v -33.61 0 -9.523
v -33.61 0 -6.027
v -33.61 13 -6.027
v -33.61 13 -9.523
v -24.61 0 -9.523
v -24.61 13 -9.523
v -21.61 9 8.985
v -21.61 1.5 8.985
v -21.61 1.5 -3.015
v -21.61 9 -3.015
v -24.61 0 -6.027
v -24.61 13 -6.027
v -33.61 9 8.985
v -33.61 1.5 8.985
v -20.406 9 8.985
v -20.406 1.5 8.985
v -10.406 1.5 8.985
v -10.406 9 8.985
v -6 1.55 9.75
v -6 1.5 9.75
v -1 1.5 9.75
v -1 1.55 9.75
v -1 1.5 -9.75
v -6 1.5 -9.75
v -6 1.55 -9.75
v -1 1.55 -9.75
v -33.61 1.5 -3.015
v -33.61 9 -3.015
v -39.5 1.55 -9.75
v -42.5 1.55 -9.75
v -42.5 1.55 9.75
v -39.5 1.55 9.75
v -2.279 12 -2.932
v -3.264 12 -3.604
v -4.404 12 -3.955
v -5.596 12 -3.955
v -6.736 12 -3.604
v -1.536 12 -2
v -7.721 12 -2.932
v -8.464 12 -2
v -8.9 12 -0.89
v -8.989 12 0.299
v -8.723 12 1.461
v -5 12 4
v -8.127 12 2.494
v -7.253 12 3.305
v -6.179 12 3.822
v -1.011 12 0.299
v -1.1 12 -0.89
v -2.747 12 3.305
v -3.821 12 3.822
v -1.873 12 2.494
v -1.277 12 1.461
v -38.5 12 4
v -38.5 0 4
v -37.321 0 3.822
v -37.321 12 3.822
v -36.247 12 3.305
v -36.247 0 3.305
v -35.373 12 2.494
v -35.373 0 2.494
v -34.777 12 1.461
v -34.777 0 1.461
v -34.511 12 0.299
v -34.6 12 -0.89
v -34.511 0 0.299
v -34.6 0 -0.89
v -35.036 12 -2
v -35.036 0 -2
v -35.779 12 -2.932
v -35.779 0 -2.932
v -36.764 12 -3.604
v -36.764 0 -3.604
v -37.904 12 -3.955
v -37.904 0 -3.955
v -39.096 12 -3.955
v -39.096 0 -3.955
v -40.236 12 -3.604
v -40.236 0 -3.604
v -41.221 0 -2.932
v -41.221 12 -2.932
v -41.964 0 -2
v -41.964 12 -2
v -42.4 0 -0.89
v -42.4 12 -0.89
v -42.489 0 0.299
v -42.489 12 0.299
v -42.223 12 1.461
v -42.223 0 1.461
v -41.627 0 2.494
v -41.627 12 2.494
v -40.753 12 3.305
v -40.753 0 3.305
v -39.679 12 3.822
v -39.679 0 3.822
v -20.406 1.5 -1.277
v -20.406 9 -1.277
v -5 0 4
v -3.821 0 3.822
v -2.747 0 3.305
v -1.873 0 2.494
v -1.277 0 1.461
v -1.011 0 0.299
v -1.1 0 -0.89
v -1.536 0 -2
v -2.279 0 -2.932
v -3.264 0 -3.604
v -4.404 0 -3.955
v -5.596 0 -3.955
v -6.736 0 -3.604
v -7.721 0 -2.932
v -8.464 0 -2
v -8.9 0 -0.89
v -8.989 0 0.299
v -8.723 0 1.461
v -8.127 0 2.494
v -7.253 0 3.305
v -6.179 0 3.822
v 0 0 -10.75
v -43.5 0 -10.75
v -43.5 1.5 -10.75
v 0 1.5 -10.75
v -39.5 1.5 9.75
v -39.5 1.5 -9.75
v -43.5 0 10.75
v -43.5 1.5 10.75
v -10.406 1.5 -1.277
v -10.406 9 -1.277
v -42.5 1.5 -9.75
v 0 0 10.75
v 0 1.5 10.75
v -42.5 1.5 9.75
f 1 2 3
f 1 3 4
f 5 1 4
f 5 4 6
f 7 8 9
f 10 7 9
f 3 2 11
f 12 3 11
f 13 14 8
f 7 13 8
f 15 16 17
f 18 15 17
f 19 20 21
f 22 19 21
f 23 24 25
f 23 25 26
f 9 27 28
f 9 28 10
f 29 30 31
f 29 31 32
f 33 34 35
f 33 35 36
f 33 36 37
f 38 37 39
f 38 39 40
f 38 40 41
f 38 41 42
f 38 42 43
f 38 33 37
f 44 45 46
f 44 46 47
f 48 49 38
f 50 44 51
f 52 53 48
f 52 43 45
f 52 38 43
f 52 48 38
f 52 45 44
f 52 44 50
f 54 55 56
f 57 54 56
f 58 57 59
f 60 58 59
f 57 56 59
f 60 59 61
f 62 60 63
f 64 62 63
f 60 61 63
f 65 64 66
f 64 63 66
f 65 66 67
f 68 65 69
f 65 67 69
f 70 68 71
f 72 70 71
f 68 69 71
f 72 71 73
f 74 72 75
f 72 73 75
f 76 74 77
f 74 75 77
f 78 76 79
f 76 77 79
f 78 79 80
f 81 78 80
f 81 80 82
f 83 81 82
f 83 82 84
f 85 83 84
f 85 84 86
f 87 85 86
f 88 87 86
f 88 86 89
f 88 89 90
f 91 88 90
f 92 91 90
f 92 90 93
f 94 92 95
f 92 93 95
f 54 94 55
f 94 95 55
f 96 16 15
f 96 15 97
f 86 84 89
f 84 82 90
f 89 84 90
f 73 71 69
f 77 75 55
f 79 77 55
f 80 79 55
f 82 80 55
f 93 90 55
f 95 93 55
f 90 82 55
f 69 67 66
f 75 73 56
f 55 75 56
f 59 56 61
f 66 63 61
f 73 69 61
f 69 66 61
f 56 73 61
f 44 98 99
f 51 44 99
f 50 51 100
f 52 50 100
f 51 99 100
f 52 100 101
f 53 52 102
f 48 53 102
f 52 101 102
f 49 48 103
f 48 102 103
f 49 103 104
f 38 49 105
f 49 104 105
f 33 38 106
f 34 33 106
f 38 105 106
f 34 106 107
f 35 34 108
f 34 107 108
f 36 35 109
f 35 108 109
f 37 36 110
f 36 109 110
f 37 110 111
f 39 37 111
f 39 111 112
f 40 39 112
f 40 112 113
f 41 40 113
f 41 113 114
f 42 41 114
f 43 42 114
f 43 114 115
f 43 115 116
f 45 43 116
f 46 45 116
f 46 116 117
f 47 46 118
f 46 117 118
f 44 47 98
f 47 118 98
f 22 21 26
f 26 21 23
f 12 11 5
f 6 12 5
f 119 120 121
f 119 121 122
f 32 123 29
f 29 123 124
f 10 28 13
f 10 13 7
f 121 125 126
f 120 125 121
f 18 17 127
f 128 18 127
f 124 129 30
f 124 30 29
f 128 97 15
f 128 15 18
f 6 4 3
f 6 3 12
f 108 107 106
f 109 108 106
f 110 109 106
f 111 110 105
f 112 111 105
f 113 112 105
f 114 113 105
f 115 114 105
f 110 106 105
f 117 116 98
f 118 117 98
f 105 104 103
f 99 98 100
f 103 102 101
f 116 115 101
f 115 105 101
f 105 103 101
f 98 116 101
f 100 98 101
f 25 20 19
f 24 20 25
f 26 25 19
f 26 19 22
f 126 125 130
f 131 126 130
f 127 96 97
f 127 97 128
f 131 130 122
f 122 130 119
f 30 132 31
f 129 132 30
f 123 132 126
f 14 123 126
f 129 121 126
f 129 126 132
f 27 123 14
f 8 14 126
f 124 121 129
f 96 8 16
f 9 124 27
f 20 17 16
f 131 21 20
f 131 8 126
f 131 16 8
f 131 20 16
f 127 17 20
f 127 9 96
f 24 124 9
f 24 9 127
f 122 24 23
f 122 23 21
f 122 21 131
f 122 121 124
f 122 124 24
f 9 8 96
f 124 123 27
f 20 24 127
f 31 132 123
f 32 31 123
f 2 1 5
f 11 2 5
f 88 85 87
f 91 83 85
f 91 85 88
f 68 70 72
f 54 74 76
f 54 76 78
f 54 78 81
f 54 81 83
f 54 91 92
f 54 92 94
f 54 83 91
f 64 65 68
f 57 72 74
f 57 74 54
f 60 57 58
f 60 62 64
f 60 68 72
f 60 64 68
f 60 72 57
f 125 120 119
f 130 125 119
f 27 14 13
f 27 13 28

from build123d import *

# Parameters (mm, degrees)
SKETCH_1_W        = 43.5
SKETCH_1_H        = 21.5
EXTRUDE_1_DEPTH   = 1.5
SKETCH_6_W        = 5
SKETCH_6_H        = 19.5
SKETCH_6_W_2      = 3
EXTRUDE_4_DEPTH   = 1.55
SKETCH_4_W        = 12
SKETCH_4_H        = 12
SKETCH_4_W_2      = 10
SKETCH_4_H_2      = 10.262080876
EXTRUDE_3_DEPTH   = 9
SKETCH_4_2_W      = 9
SKETCH_4_2_H      = 3.495381259
EXTRUDE_5_DEPTH   = 13
SKETCH_4_3_R      = 4
EXTRUDE_6_DEPTH   = 12
EXTRUDE_6_2_DEPTH = 12


with BuildPart() as part:
    # Эскиз1 → Бобышка-Вытянуть1 (new body)
    with BuildSketch(Plane(origin=(0, 0, 0), x_dir=(1, 0, 0), z_dir=(0, 1, 0))):
        with Locations((-21.75, 0)):
            Rectangle(SKETCH_1_W, SKETCH_1_H)
    extrude(amount=EXTRUDE_1_DEPTH)

    # Эскиз6 → Бобышка-Вытянуть4 (add)
    with BuildSketch(Plane(origin=(0, 0, 0), x_dir=(1, 0, 0), z_dir=(0, 1, 0))):
        with Locations((-3.5, 0)):
            Rectangle(SKETCH_6_W, SKETCH_6_H)
        with Locations((-41, 0)):
            Rectangle(SKETCH_6_W_2, SKETCH_6_H)
    extrude(amount=EXTRUDE_4_DEPTH)

    # Эскиз4 → Бобышка-Вытянуть3 (add)
    with BuildSketch(Plane(origin=(0, 0, 0), x_dir=(1, 0, 0), z_dir=(0, 1, 0))):
        with Locations((-27.610333503, -2.984922339)):
            Rectangle(SKETCH_4_W, SKETCH_4_H)
        with Locations((-15.405622593, -3.853881901)):
            Rectangle(SKETCH_4_W_2, SKETCH_4_H_2)
    extrude(amount=EXTRUDE_3_DEPTH)


with BuildPart() as body_2:
    # Эскиз4<2> → Бобышка-Вытянуть5 (new body)
    with BuildSketch(Plane(origin=(0, 0, 0), x_dir=(1, 0, 0), z_dir=(0, 1, 0))):
        with Locations((-29.110333503, 7.774982673)):
            Rectangle(SKETCH_4_2_W, SKETCH_4_2_H)
    extrude(amount=EXTRUDE_5_DEPTH)


with BuildPart() as body_3:
    # Эскиз4<3> → Бобышка-Вытянуть6 (new body)
    with BuildSketch(Plane(origin=(0, 0, 0), x_dir=(1, 0, 0), z_dir=(0, 1, 0))):
        with Locations(Location((-38.5, 0, 0), (0, 0, 270))):
            Circle(SKETCH_4_3_R)
    extrude(amount=EXTRUDE_6_DEPTH)


with BuildPart() as body_4:
    # Эскиз4<3> → Extrude 6 2 (new body)
    with BuildSketch(Plane(origin=(0, 0, 0), x_dir=(1, 0, 0), z_dir=(0, 1, 0))):
        with Locations(Location((-5, 0, 0), (0, 0, 270))):
            Circle(SKETCH_4_3_R)
    extrude(amount=EXTRUDE_6_2_DEPTH)


solid = Compound([part.part, body_2.part, body_3.part, body_4.part])
